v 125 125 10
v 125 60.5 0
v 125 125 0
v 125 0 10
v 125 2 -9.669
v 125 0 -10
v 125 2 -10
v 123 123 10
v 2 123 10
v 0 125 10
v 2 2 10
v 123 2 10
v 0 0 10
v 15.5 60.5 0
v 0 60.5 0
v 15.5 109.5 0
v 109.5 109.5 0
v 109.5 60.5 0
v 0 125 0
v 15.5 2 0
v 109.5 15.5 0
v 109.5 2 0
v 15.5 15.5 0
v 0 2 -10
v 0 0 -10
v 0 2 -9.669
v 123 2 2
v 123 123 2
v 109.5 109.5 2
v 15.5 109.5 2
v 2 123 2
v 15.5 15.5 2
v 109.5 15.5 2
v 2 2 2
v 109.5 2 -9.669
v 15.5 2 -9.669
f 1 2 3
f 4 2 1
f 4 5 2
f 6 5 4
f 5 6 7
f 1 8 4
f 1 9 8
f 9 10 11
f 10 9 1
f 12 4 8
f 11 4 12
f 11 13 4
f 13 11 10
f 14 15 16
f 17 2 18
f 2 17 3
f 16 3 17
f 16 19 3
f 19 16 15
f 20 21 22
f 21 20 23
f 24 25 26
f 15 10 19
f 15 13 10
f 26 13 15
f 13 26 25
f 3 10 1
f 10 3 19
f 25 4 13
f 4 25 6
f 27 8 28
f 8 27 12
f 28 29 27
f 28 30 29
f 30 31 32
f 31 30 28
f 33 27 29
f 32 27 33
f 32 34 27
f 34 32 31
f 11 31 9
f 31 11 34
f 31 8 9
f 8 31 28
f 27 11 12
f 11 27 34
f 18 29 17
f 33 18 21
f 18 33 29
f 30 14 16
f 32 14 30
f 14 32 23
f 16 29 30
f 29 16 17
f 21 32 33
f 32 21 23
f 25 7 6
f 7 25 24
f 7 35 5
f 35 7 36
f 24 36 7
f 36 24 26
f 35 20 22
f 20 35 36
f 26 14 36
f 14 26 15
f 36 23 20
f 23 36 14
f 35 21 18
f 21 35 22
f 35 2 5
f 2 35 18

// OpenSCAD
$fn=400;

breite=121;
laenge=121;
hoehe=10;
wandstaerke=4;

// Halterung für Kapselpackung
//
difference()
{
    cube([breite + wandstaerke, laenge + wandstaerke, hoehe]);
    
    translate([wandstaerke/2, wandstaerke/2, wandstaerke/2])
    cube([breite, laenge, hoehe]);
    
    translate([breite/2-(breite-27)/2 +wandstaerke/2,laenge/2-(breite-27)/2 + wandstaerke/2,0])
    cube([breite-27, breite-27, wandstaerke]);
}

// Kleberand
//
translate([0,0,-10])
cube([breite+wandstaerke, wandstaerke/2, 10]);

// Verstärkung unten
//
/*
translate([9,0,0])
difference(){
   
    translate([0,0,0])
    rotate([90, 0, 90])
    cylinder(12,11 + wandstaerke,11 + wandstaerke);

    translate([0,-15,-20])
    cube([breite-20+0.5, 15, 40]);

    translate([0,wandstaerke/2, wandstaerke/2])
    cube([breite-20+0.5,20,20]);

    translate([0,0,+hoehe])
    cube([breite-20+0.5, wandstaerke/2, hoehe*2]);
}

translate([104,0,0])
difference(){
   
    translate([0,0,0])
    rotate([90, 0, 90])
    cylinder(12,11+wandstaerke,11+wandstaerke);

    translate([0,-15,-20])
    cube([breite-20+0.5, 15, 40]);

    translate([0,wandstaerke/2, wandstaerke/2])
    cube([breite-20+0.5,20,20]);

    translate([0,0,+hoehe])
    cube([breite-20+0.5, wandstaerke/2, hoehe*2]);
}
*/

translate([0,0,0])
rotate([90,0,90])
linear_extrude(15.5)
polygon(points=[[0,0],[laenge/2,0],[0,-10.0]]);

translate([breite-15.5+wandstaerke,0,0])
rotate([90,0,90])
linear_extrude(15.5)
polygon(points=[[0,0],[laenge/2,0],[0,-10.0]]);
